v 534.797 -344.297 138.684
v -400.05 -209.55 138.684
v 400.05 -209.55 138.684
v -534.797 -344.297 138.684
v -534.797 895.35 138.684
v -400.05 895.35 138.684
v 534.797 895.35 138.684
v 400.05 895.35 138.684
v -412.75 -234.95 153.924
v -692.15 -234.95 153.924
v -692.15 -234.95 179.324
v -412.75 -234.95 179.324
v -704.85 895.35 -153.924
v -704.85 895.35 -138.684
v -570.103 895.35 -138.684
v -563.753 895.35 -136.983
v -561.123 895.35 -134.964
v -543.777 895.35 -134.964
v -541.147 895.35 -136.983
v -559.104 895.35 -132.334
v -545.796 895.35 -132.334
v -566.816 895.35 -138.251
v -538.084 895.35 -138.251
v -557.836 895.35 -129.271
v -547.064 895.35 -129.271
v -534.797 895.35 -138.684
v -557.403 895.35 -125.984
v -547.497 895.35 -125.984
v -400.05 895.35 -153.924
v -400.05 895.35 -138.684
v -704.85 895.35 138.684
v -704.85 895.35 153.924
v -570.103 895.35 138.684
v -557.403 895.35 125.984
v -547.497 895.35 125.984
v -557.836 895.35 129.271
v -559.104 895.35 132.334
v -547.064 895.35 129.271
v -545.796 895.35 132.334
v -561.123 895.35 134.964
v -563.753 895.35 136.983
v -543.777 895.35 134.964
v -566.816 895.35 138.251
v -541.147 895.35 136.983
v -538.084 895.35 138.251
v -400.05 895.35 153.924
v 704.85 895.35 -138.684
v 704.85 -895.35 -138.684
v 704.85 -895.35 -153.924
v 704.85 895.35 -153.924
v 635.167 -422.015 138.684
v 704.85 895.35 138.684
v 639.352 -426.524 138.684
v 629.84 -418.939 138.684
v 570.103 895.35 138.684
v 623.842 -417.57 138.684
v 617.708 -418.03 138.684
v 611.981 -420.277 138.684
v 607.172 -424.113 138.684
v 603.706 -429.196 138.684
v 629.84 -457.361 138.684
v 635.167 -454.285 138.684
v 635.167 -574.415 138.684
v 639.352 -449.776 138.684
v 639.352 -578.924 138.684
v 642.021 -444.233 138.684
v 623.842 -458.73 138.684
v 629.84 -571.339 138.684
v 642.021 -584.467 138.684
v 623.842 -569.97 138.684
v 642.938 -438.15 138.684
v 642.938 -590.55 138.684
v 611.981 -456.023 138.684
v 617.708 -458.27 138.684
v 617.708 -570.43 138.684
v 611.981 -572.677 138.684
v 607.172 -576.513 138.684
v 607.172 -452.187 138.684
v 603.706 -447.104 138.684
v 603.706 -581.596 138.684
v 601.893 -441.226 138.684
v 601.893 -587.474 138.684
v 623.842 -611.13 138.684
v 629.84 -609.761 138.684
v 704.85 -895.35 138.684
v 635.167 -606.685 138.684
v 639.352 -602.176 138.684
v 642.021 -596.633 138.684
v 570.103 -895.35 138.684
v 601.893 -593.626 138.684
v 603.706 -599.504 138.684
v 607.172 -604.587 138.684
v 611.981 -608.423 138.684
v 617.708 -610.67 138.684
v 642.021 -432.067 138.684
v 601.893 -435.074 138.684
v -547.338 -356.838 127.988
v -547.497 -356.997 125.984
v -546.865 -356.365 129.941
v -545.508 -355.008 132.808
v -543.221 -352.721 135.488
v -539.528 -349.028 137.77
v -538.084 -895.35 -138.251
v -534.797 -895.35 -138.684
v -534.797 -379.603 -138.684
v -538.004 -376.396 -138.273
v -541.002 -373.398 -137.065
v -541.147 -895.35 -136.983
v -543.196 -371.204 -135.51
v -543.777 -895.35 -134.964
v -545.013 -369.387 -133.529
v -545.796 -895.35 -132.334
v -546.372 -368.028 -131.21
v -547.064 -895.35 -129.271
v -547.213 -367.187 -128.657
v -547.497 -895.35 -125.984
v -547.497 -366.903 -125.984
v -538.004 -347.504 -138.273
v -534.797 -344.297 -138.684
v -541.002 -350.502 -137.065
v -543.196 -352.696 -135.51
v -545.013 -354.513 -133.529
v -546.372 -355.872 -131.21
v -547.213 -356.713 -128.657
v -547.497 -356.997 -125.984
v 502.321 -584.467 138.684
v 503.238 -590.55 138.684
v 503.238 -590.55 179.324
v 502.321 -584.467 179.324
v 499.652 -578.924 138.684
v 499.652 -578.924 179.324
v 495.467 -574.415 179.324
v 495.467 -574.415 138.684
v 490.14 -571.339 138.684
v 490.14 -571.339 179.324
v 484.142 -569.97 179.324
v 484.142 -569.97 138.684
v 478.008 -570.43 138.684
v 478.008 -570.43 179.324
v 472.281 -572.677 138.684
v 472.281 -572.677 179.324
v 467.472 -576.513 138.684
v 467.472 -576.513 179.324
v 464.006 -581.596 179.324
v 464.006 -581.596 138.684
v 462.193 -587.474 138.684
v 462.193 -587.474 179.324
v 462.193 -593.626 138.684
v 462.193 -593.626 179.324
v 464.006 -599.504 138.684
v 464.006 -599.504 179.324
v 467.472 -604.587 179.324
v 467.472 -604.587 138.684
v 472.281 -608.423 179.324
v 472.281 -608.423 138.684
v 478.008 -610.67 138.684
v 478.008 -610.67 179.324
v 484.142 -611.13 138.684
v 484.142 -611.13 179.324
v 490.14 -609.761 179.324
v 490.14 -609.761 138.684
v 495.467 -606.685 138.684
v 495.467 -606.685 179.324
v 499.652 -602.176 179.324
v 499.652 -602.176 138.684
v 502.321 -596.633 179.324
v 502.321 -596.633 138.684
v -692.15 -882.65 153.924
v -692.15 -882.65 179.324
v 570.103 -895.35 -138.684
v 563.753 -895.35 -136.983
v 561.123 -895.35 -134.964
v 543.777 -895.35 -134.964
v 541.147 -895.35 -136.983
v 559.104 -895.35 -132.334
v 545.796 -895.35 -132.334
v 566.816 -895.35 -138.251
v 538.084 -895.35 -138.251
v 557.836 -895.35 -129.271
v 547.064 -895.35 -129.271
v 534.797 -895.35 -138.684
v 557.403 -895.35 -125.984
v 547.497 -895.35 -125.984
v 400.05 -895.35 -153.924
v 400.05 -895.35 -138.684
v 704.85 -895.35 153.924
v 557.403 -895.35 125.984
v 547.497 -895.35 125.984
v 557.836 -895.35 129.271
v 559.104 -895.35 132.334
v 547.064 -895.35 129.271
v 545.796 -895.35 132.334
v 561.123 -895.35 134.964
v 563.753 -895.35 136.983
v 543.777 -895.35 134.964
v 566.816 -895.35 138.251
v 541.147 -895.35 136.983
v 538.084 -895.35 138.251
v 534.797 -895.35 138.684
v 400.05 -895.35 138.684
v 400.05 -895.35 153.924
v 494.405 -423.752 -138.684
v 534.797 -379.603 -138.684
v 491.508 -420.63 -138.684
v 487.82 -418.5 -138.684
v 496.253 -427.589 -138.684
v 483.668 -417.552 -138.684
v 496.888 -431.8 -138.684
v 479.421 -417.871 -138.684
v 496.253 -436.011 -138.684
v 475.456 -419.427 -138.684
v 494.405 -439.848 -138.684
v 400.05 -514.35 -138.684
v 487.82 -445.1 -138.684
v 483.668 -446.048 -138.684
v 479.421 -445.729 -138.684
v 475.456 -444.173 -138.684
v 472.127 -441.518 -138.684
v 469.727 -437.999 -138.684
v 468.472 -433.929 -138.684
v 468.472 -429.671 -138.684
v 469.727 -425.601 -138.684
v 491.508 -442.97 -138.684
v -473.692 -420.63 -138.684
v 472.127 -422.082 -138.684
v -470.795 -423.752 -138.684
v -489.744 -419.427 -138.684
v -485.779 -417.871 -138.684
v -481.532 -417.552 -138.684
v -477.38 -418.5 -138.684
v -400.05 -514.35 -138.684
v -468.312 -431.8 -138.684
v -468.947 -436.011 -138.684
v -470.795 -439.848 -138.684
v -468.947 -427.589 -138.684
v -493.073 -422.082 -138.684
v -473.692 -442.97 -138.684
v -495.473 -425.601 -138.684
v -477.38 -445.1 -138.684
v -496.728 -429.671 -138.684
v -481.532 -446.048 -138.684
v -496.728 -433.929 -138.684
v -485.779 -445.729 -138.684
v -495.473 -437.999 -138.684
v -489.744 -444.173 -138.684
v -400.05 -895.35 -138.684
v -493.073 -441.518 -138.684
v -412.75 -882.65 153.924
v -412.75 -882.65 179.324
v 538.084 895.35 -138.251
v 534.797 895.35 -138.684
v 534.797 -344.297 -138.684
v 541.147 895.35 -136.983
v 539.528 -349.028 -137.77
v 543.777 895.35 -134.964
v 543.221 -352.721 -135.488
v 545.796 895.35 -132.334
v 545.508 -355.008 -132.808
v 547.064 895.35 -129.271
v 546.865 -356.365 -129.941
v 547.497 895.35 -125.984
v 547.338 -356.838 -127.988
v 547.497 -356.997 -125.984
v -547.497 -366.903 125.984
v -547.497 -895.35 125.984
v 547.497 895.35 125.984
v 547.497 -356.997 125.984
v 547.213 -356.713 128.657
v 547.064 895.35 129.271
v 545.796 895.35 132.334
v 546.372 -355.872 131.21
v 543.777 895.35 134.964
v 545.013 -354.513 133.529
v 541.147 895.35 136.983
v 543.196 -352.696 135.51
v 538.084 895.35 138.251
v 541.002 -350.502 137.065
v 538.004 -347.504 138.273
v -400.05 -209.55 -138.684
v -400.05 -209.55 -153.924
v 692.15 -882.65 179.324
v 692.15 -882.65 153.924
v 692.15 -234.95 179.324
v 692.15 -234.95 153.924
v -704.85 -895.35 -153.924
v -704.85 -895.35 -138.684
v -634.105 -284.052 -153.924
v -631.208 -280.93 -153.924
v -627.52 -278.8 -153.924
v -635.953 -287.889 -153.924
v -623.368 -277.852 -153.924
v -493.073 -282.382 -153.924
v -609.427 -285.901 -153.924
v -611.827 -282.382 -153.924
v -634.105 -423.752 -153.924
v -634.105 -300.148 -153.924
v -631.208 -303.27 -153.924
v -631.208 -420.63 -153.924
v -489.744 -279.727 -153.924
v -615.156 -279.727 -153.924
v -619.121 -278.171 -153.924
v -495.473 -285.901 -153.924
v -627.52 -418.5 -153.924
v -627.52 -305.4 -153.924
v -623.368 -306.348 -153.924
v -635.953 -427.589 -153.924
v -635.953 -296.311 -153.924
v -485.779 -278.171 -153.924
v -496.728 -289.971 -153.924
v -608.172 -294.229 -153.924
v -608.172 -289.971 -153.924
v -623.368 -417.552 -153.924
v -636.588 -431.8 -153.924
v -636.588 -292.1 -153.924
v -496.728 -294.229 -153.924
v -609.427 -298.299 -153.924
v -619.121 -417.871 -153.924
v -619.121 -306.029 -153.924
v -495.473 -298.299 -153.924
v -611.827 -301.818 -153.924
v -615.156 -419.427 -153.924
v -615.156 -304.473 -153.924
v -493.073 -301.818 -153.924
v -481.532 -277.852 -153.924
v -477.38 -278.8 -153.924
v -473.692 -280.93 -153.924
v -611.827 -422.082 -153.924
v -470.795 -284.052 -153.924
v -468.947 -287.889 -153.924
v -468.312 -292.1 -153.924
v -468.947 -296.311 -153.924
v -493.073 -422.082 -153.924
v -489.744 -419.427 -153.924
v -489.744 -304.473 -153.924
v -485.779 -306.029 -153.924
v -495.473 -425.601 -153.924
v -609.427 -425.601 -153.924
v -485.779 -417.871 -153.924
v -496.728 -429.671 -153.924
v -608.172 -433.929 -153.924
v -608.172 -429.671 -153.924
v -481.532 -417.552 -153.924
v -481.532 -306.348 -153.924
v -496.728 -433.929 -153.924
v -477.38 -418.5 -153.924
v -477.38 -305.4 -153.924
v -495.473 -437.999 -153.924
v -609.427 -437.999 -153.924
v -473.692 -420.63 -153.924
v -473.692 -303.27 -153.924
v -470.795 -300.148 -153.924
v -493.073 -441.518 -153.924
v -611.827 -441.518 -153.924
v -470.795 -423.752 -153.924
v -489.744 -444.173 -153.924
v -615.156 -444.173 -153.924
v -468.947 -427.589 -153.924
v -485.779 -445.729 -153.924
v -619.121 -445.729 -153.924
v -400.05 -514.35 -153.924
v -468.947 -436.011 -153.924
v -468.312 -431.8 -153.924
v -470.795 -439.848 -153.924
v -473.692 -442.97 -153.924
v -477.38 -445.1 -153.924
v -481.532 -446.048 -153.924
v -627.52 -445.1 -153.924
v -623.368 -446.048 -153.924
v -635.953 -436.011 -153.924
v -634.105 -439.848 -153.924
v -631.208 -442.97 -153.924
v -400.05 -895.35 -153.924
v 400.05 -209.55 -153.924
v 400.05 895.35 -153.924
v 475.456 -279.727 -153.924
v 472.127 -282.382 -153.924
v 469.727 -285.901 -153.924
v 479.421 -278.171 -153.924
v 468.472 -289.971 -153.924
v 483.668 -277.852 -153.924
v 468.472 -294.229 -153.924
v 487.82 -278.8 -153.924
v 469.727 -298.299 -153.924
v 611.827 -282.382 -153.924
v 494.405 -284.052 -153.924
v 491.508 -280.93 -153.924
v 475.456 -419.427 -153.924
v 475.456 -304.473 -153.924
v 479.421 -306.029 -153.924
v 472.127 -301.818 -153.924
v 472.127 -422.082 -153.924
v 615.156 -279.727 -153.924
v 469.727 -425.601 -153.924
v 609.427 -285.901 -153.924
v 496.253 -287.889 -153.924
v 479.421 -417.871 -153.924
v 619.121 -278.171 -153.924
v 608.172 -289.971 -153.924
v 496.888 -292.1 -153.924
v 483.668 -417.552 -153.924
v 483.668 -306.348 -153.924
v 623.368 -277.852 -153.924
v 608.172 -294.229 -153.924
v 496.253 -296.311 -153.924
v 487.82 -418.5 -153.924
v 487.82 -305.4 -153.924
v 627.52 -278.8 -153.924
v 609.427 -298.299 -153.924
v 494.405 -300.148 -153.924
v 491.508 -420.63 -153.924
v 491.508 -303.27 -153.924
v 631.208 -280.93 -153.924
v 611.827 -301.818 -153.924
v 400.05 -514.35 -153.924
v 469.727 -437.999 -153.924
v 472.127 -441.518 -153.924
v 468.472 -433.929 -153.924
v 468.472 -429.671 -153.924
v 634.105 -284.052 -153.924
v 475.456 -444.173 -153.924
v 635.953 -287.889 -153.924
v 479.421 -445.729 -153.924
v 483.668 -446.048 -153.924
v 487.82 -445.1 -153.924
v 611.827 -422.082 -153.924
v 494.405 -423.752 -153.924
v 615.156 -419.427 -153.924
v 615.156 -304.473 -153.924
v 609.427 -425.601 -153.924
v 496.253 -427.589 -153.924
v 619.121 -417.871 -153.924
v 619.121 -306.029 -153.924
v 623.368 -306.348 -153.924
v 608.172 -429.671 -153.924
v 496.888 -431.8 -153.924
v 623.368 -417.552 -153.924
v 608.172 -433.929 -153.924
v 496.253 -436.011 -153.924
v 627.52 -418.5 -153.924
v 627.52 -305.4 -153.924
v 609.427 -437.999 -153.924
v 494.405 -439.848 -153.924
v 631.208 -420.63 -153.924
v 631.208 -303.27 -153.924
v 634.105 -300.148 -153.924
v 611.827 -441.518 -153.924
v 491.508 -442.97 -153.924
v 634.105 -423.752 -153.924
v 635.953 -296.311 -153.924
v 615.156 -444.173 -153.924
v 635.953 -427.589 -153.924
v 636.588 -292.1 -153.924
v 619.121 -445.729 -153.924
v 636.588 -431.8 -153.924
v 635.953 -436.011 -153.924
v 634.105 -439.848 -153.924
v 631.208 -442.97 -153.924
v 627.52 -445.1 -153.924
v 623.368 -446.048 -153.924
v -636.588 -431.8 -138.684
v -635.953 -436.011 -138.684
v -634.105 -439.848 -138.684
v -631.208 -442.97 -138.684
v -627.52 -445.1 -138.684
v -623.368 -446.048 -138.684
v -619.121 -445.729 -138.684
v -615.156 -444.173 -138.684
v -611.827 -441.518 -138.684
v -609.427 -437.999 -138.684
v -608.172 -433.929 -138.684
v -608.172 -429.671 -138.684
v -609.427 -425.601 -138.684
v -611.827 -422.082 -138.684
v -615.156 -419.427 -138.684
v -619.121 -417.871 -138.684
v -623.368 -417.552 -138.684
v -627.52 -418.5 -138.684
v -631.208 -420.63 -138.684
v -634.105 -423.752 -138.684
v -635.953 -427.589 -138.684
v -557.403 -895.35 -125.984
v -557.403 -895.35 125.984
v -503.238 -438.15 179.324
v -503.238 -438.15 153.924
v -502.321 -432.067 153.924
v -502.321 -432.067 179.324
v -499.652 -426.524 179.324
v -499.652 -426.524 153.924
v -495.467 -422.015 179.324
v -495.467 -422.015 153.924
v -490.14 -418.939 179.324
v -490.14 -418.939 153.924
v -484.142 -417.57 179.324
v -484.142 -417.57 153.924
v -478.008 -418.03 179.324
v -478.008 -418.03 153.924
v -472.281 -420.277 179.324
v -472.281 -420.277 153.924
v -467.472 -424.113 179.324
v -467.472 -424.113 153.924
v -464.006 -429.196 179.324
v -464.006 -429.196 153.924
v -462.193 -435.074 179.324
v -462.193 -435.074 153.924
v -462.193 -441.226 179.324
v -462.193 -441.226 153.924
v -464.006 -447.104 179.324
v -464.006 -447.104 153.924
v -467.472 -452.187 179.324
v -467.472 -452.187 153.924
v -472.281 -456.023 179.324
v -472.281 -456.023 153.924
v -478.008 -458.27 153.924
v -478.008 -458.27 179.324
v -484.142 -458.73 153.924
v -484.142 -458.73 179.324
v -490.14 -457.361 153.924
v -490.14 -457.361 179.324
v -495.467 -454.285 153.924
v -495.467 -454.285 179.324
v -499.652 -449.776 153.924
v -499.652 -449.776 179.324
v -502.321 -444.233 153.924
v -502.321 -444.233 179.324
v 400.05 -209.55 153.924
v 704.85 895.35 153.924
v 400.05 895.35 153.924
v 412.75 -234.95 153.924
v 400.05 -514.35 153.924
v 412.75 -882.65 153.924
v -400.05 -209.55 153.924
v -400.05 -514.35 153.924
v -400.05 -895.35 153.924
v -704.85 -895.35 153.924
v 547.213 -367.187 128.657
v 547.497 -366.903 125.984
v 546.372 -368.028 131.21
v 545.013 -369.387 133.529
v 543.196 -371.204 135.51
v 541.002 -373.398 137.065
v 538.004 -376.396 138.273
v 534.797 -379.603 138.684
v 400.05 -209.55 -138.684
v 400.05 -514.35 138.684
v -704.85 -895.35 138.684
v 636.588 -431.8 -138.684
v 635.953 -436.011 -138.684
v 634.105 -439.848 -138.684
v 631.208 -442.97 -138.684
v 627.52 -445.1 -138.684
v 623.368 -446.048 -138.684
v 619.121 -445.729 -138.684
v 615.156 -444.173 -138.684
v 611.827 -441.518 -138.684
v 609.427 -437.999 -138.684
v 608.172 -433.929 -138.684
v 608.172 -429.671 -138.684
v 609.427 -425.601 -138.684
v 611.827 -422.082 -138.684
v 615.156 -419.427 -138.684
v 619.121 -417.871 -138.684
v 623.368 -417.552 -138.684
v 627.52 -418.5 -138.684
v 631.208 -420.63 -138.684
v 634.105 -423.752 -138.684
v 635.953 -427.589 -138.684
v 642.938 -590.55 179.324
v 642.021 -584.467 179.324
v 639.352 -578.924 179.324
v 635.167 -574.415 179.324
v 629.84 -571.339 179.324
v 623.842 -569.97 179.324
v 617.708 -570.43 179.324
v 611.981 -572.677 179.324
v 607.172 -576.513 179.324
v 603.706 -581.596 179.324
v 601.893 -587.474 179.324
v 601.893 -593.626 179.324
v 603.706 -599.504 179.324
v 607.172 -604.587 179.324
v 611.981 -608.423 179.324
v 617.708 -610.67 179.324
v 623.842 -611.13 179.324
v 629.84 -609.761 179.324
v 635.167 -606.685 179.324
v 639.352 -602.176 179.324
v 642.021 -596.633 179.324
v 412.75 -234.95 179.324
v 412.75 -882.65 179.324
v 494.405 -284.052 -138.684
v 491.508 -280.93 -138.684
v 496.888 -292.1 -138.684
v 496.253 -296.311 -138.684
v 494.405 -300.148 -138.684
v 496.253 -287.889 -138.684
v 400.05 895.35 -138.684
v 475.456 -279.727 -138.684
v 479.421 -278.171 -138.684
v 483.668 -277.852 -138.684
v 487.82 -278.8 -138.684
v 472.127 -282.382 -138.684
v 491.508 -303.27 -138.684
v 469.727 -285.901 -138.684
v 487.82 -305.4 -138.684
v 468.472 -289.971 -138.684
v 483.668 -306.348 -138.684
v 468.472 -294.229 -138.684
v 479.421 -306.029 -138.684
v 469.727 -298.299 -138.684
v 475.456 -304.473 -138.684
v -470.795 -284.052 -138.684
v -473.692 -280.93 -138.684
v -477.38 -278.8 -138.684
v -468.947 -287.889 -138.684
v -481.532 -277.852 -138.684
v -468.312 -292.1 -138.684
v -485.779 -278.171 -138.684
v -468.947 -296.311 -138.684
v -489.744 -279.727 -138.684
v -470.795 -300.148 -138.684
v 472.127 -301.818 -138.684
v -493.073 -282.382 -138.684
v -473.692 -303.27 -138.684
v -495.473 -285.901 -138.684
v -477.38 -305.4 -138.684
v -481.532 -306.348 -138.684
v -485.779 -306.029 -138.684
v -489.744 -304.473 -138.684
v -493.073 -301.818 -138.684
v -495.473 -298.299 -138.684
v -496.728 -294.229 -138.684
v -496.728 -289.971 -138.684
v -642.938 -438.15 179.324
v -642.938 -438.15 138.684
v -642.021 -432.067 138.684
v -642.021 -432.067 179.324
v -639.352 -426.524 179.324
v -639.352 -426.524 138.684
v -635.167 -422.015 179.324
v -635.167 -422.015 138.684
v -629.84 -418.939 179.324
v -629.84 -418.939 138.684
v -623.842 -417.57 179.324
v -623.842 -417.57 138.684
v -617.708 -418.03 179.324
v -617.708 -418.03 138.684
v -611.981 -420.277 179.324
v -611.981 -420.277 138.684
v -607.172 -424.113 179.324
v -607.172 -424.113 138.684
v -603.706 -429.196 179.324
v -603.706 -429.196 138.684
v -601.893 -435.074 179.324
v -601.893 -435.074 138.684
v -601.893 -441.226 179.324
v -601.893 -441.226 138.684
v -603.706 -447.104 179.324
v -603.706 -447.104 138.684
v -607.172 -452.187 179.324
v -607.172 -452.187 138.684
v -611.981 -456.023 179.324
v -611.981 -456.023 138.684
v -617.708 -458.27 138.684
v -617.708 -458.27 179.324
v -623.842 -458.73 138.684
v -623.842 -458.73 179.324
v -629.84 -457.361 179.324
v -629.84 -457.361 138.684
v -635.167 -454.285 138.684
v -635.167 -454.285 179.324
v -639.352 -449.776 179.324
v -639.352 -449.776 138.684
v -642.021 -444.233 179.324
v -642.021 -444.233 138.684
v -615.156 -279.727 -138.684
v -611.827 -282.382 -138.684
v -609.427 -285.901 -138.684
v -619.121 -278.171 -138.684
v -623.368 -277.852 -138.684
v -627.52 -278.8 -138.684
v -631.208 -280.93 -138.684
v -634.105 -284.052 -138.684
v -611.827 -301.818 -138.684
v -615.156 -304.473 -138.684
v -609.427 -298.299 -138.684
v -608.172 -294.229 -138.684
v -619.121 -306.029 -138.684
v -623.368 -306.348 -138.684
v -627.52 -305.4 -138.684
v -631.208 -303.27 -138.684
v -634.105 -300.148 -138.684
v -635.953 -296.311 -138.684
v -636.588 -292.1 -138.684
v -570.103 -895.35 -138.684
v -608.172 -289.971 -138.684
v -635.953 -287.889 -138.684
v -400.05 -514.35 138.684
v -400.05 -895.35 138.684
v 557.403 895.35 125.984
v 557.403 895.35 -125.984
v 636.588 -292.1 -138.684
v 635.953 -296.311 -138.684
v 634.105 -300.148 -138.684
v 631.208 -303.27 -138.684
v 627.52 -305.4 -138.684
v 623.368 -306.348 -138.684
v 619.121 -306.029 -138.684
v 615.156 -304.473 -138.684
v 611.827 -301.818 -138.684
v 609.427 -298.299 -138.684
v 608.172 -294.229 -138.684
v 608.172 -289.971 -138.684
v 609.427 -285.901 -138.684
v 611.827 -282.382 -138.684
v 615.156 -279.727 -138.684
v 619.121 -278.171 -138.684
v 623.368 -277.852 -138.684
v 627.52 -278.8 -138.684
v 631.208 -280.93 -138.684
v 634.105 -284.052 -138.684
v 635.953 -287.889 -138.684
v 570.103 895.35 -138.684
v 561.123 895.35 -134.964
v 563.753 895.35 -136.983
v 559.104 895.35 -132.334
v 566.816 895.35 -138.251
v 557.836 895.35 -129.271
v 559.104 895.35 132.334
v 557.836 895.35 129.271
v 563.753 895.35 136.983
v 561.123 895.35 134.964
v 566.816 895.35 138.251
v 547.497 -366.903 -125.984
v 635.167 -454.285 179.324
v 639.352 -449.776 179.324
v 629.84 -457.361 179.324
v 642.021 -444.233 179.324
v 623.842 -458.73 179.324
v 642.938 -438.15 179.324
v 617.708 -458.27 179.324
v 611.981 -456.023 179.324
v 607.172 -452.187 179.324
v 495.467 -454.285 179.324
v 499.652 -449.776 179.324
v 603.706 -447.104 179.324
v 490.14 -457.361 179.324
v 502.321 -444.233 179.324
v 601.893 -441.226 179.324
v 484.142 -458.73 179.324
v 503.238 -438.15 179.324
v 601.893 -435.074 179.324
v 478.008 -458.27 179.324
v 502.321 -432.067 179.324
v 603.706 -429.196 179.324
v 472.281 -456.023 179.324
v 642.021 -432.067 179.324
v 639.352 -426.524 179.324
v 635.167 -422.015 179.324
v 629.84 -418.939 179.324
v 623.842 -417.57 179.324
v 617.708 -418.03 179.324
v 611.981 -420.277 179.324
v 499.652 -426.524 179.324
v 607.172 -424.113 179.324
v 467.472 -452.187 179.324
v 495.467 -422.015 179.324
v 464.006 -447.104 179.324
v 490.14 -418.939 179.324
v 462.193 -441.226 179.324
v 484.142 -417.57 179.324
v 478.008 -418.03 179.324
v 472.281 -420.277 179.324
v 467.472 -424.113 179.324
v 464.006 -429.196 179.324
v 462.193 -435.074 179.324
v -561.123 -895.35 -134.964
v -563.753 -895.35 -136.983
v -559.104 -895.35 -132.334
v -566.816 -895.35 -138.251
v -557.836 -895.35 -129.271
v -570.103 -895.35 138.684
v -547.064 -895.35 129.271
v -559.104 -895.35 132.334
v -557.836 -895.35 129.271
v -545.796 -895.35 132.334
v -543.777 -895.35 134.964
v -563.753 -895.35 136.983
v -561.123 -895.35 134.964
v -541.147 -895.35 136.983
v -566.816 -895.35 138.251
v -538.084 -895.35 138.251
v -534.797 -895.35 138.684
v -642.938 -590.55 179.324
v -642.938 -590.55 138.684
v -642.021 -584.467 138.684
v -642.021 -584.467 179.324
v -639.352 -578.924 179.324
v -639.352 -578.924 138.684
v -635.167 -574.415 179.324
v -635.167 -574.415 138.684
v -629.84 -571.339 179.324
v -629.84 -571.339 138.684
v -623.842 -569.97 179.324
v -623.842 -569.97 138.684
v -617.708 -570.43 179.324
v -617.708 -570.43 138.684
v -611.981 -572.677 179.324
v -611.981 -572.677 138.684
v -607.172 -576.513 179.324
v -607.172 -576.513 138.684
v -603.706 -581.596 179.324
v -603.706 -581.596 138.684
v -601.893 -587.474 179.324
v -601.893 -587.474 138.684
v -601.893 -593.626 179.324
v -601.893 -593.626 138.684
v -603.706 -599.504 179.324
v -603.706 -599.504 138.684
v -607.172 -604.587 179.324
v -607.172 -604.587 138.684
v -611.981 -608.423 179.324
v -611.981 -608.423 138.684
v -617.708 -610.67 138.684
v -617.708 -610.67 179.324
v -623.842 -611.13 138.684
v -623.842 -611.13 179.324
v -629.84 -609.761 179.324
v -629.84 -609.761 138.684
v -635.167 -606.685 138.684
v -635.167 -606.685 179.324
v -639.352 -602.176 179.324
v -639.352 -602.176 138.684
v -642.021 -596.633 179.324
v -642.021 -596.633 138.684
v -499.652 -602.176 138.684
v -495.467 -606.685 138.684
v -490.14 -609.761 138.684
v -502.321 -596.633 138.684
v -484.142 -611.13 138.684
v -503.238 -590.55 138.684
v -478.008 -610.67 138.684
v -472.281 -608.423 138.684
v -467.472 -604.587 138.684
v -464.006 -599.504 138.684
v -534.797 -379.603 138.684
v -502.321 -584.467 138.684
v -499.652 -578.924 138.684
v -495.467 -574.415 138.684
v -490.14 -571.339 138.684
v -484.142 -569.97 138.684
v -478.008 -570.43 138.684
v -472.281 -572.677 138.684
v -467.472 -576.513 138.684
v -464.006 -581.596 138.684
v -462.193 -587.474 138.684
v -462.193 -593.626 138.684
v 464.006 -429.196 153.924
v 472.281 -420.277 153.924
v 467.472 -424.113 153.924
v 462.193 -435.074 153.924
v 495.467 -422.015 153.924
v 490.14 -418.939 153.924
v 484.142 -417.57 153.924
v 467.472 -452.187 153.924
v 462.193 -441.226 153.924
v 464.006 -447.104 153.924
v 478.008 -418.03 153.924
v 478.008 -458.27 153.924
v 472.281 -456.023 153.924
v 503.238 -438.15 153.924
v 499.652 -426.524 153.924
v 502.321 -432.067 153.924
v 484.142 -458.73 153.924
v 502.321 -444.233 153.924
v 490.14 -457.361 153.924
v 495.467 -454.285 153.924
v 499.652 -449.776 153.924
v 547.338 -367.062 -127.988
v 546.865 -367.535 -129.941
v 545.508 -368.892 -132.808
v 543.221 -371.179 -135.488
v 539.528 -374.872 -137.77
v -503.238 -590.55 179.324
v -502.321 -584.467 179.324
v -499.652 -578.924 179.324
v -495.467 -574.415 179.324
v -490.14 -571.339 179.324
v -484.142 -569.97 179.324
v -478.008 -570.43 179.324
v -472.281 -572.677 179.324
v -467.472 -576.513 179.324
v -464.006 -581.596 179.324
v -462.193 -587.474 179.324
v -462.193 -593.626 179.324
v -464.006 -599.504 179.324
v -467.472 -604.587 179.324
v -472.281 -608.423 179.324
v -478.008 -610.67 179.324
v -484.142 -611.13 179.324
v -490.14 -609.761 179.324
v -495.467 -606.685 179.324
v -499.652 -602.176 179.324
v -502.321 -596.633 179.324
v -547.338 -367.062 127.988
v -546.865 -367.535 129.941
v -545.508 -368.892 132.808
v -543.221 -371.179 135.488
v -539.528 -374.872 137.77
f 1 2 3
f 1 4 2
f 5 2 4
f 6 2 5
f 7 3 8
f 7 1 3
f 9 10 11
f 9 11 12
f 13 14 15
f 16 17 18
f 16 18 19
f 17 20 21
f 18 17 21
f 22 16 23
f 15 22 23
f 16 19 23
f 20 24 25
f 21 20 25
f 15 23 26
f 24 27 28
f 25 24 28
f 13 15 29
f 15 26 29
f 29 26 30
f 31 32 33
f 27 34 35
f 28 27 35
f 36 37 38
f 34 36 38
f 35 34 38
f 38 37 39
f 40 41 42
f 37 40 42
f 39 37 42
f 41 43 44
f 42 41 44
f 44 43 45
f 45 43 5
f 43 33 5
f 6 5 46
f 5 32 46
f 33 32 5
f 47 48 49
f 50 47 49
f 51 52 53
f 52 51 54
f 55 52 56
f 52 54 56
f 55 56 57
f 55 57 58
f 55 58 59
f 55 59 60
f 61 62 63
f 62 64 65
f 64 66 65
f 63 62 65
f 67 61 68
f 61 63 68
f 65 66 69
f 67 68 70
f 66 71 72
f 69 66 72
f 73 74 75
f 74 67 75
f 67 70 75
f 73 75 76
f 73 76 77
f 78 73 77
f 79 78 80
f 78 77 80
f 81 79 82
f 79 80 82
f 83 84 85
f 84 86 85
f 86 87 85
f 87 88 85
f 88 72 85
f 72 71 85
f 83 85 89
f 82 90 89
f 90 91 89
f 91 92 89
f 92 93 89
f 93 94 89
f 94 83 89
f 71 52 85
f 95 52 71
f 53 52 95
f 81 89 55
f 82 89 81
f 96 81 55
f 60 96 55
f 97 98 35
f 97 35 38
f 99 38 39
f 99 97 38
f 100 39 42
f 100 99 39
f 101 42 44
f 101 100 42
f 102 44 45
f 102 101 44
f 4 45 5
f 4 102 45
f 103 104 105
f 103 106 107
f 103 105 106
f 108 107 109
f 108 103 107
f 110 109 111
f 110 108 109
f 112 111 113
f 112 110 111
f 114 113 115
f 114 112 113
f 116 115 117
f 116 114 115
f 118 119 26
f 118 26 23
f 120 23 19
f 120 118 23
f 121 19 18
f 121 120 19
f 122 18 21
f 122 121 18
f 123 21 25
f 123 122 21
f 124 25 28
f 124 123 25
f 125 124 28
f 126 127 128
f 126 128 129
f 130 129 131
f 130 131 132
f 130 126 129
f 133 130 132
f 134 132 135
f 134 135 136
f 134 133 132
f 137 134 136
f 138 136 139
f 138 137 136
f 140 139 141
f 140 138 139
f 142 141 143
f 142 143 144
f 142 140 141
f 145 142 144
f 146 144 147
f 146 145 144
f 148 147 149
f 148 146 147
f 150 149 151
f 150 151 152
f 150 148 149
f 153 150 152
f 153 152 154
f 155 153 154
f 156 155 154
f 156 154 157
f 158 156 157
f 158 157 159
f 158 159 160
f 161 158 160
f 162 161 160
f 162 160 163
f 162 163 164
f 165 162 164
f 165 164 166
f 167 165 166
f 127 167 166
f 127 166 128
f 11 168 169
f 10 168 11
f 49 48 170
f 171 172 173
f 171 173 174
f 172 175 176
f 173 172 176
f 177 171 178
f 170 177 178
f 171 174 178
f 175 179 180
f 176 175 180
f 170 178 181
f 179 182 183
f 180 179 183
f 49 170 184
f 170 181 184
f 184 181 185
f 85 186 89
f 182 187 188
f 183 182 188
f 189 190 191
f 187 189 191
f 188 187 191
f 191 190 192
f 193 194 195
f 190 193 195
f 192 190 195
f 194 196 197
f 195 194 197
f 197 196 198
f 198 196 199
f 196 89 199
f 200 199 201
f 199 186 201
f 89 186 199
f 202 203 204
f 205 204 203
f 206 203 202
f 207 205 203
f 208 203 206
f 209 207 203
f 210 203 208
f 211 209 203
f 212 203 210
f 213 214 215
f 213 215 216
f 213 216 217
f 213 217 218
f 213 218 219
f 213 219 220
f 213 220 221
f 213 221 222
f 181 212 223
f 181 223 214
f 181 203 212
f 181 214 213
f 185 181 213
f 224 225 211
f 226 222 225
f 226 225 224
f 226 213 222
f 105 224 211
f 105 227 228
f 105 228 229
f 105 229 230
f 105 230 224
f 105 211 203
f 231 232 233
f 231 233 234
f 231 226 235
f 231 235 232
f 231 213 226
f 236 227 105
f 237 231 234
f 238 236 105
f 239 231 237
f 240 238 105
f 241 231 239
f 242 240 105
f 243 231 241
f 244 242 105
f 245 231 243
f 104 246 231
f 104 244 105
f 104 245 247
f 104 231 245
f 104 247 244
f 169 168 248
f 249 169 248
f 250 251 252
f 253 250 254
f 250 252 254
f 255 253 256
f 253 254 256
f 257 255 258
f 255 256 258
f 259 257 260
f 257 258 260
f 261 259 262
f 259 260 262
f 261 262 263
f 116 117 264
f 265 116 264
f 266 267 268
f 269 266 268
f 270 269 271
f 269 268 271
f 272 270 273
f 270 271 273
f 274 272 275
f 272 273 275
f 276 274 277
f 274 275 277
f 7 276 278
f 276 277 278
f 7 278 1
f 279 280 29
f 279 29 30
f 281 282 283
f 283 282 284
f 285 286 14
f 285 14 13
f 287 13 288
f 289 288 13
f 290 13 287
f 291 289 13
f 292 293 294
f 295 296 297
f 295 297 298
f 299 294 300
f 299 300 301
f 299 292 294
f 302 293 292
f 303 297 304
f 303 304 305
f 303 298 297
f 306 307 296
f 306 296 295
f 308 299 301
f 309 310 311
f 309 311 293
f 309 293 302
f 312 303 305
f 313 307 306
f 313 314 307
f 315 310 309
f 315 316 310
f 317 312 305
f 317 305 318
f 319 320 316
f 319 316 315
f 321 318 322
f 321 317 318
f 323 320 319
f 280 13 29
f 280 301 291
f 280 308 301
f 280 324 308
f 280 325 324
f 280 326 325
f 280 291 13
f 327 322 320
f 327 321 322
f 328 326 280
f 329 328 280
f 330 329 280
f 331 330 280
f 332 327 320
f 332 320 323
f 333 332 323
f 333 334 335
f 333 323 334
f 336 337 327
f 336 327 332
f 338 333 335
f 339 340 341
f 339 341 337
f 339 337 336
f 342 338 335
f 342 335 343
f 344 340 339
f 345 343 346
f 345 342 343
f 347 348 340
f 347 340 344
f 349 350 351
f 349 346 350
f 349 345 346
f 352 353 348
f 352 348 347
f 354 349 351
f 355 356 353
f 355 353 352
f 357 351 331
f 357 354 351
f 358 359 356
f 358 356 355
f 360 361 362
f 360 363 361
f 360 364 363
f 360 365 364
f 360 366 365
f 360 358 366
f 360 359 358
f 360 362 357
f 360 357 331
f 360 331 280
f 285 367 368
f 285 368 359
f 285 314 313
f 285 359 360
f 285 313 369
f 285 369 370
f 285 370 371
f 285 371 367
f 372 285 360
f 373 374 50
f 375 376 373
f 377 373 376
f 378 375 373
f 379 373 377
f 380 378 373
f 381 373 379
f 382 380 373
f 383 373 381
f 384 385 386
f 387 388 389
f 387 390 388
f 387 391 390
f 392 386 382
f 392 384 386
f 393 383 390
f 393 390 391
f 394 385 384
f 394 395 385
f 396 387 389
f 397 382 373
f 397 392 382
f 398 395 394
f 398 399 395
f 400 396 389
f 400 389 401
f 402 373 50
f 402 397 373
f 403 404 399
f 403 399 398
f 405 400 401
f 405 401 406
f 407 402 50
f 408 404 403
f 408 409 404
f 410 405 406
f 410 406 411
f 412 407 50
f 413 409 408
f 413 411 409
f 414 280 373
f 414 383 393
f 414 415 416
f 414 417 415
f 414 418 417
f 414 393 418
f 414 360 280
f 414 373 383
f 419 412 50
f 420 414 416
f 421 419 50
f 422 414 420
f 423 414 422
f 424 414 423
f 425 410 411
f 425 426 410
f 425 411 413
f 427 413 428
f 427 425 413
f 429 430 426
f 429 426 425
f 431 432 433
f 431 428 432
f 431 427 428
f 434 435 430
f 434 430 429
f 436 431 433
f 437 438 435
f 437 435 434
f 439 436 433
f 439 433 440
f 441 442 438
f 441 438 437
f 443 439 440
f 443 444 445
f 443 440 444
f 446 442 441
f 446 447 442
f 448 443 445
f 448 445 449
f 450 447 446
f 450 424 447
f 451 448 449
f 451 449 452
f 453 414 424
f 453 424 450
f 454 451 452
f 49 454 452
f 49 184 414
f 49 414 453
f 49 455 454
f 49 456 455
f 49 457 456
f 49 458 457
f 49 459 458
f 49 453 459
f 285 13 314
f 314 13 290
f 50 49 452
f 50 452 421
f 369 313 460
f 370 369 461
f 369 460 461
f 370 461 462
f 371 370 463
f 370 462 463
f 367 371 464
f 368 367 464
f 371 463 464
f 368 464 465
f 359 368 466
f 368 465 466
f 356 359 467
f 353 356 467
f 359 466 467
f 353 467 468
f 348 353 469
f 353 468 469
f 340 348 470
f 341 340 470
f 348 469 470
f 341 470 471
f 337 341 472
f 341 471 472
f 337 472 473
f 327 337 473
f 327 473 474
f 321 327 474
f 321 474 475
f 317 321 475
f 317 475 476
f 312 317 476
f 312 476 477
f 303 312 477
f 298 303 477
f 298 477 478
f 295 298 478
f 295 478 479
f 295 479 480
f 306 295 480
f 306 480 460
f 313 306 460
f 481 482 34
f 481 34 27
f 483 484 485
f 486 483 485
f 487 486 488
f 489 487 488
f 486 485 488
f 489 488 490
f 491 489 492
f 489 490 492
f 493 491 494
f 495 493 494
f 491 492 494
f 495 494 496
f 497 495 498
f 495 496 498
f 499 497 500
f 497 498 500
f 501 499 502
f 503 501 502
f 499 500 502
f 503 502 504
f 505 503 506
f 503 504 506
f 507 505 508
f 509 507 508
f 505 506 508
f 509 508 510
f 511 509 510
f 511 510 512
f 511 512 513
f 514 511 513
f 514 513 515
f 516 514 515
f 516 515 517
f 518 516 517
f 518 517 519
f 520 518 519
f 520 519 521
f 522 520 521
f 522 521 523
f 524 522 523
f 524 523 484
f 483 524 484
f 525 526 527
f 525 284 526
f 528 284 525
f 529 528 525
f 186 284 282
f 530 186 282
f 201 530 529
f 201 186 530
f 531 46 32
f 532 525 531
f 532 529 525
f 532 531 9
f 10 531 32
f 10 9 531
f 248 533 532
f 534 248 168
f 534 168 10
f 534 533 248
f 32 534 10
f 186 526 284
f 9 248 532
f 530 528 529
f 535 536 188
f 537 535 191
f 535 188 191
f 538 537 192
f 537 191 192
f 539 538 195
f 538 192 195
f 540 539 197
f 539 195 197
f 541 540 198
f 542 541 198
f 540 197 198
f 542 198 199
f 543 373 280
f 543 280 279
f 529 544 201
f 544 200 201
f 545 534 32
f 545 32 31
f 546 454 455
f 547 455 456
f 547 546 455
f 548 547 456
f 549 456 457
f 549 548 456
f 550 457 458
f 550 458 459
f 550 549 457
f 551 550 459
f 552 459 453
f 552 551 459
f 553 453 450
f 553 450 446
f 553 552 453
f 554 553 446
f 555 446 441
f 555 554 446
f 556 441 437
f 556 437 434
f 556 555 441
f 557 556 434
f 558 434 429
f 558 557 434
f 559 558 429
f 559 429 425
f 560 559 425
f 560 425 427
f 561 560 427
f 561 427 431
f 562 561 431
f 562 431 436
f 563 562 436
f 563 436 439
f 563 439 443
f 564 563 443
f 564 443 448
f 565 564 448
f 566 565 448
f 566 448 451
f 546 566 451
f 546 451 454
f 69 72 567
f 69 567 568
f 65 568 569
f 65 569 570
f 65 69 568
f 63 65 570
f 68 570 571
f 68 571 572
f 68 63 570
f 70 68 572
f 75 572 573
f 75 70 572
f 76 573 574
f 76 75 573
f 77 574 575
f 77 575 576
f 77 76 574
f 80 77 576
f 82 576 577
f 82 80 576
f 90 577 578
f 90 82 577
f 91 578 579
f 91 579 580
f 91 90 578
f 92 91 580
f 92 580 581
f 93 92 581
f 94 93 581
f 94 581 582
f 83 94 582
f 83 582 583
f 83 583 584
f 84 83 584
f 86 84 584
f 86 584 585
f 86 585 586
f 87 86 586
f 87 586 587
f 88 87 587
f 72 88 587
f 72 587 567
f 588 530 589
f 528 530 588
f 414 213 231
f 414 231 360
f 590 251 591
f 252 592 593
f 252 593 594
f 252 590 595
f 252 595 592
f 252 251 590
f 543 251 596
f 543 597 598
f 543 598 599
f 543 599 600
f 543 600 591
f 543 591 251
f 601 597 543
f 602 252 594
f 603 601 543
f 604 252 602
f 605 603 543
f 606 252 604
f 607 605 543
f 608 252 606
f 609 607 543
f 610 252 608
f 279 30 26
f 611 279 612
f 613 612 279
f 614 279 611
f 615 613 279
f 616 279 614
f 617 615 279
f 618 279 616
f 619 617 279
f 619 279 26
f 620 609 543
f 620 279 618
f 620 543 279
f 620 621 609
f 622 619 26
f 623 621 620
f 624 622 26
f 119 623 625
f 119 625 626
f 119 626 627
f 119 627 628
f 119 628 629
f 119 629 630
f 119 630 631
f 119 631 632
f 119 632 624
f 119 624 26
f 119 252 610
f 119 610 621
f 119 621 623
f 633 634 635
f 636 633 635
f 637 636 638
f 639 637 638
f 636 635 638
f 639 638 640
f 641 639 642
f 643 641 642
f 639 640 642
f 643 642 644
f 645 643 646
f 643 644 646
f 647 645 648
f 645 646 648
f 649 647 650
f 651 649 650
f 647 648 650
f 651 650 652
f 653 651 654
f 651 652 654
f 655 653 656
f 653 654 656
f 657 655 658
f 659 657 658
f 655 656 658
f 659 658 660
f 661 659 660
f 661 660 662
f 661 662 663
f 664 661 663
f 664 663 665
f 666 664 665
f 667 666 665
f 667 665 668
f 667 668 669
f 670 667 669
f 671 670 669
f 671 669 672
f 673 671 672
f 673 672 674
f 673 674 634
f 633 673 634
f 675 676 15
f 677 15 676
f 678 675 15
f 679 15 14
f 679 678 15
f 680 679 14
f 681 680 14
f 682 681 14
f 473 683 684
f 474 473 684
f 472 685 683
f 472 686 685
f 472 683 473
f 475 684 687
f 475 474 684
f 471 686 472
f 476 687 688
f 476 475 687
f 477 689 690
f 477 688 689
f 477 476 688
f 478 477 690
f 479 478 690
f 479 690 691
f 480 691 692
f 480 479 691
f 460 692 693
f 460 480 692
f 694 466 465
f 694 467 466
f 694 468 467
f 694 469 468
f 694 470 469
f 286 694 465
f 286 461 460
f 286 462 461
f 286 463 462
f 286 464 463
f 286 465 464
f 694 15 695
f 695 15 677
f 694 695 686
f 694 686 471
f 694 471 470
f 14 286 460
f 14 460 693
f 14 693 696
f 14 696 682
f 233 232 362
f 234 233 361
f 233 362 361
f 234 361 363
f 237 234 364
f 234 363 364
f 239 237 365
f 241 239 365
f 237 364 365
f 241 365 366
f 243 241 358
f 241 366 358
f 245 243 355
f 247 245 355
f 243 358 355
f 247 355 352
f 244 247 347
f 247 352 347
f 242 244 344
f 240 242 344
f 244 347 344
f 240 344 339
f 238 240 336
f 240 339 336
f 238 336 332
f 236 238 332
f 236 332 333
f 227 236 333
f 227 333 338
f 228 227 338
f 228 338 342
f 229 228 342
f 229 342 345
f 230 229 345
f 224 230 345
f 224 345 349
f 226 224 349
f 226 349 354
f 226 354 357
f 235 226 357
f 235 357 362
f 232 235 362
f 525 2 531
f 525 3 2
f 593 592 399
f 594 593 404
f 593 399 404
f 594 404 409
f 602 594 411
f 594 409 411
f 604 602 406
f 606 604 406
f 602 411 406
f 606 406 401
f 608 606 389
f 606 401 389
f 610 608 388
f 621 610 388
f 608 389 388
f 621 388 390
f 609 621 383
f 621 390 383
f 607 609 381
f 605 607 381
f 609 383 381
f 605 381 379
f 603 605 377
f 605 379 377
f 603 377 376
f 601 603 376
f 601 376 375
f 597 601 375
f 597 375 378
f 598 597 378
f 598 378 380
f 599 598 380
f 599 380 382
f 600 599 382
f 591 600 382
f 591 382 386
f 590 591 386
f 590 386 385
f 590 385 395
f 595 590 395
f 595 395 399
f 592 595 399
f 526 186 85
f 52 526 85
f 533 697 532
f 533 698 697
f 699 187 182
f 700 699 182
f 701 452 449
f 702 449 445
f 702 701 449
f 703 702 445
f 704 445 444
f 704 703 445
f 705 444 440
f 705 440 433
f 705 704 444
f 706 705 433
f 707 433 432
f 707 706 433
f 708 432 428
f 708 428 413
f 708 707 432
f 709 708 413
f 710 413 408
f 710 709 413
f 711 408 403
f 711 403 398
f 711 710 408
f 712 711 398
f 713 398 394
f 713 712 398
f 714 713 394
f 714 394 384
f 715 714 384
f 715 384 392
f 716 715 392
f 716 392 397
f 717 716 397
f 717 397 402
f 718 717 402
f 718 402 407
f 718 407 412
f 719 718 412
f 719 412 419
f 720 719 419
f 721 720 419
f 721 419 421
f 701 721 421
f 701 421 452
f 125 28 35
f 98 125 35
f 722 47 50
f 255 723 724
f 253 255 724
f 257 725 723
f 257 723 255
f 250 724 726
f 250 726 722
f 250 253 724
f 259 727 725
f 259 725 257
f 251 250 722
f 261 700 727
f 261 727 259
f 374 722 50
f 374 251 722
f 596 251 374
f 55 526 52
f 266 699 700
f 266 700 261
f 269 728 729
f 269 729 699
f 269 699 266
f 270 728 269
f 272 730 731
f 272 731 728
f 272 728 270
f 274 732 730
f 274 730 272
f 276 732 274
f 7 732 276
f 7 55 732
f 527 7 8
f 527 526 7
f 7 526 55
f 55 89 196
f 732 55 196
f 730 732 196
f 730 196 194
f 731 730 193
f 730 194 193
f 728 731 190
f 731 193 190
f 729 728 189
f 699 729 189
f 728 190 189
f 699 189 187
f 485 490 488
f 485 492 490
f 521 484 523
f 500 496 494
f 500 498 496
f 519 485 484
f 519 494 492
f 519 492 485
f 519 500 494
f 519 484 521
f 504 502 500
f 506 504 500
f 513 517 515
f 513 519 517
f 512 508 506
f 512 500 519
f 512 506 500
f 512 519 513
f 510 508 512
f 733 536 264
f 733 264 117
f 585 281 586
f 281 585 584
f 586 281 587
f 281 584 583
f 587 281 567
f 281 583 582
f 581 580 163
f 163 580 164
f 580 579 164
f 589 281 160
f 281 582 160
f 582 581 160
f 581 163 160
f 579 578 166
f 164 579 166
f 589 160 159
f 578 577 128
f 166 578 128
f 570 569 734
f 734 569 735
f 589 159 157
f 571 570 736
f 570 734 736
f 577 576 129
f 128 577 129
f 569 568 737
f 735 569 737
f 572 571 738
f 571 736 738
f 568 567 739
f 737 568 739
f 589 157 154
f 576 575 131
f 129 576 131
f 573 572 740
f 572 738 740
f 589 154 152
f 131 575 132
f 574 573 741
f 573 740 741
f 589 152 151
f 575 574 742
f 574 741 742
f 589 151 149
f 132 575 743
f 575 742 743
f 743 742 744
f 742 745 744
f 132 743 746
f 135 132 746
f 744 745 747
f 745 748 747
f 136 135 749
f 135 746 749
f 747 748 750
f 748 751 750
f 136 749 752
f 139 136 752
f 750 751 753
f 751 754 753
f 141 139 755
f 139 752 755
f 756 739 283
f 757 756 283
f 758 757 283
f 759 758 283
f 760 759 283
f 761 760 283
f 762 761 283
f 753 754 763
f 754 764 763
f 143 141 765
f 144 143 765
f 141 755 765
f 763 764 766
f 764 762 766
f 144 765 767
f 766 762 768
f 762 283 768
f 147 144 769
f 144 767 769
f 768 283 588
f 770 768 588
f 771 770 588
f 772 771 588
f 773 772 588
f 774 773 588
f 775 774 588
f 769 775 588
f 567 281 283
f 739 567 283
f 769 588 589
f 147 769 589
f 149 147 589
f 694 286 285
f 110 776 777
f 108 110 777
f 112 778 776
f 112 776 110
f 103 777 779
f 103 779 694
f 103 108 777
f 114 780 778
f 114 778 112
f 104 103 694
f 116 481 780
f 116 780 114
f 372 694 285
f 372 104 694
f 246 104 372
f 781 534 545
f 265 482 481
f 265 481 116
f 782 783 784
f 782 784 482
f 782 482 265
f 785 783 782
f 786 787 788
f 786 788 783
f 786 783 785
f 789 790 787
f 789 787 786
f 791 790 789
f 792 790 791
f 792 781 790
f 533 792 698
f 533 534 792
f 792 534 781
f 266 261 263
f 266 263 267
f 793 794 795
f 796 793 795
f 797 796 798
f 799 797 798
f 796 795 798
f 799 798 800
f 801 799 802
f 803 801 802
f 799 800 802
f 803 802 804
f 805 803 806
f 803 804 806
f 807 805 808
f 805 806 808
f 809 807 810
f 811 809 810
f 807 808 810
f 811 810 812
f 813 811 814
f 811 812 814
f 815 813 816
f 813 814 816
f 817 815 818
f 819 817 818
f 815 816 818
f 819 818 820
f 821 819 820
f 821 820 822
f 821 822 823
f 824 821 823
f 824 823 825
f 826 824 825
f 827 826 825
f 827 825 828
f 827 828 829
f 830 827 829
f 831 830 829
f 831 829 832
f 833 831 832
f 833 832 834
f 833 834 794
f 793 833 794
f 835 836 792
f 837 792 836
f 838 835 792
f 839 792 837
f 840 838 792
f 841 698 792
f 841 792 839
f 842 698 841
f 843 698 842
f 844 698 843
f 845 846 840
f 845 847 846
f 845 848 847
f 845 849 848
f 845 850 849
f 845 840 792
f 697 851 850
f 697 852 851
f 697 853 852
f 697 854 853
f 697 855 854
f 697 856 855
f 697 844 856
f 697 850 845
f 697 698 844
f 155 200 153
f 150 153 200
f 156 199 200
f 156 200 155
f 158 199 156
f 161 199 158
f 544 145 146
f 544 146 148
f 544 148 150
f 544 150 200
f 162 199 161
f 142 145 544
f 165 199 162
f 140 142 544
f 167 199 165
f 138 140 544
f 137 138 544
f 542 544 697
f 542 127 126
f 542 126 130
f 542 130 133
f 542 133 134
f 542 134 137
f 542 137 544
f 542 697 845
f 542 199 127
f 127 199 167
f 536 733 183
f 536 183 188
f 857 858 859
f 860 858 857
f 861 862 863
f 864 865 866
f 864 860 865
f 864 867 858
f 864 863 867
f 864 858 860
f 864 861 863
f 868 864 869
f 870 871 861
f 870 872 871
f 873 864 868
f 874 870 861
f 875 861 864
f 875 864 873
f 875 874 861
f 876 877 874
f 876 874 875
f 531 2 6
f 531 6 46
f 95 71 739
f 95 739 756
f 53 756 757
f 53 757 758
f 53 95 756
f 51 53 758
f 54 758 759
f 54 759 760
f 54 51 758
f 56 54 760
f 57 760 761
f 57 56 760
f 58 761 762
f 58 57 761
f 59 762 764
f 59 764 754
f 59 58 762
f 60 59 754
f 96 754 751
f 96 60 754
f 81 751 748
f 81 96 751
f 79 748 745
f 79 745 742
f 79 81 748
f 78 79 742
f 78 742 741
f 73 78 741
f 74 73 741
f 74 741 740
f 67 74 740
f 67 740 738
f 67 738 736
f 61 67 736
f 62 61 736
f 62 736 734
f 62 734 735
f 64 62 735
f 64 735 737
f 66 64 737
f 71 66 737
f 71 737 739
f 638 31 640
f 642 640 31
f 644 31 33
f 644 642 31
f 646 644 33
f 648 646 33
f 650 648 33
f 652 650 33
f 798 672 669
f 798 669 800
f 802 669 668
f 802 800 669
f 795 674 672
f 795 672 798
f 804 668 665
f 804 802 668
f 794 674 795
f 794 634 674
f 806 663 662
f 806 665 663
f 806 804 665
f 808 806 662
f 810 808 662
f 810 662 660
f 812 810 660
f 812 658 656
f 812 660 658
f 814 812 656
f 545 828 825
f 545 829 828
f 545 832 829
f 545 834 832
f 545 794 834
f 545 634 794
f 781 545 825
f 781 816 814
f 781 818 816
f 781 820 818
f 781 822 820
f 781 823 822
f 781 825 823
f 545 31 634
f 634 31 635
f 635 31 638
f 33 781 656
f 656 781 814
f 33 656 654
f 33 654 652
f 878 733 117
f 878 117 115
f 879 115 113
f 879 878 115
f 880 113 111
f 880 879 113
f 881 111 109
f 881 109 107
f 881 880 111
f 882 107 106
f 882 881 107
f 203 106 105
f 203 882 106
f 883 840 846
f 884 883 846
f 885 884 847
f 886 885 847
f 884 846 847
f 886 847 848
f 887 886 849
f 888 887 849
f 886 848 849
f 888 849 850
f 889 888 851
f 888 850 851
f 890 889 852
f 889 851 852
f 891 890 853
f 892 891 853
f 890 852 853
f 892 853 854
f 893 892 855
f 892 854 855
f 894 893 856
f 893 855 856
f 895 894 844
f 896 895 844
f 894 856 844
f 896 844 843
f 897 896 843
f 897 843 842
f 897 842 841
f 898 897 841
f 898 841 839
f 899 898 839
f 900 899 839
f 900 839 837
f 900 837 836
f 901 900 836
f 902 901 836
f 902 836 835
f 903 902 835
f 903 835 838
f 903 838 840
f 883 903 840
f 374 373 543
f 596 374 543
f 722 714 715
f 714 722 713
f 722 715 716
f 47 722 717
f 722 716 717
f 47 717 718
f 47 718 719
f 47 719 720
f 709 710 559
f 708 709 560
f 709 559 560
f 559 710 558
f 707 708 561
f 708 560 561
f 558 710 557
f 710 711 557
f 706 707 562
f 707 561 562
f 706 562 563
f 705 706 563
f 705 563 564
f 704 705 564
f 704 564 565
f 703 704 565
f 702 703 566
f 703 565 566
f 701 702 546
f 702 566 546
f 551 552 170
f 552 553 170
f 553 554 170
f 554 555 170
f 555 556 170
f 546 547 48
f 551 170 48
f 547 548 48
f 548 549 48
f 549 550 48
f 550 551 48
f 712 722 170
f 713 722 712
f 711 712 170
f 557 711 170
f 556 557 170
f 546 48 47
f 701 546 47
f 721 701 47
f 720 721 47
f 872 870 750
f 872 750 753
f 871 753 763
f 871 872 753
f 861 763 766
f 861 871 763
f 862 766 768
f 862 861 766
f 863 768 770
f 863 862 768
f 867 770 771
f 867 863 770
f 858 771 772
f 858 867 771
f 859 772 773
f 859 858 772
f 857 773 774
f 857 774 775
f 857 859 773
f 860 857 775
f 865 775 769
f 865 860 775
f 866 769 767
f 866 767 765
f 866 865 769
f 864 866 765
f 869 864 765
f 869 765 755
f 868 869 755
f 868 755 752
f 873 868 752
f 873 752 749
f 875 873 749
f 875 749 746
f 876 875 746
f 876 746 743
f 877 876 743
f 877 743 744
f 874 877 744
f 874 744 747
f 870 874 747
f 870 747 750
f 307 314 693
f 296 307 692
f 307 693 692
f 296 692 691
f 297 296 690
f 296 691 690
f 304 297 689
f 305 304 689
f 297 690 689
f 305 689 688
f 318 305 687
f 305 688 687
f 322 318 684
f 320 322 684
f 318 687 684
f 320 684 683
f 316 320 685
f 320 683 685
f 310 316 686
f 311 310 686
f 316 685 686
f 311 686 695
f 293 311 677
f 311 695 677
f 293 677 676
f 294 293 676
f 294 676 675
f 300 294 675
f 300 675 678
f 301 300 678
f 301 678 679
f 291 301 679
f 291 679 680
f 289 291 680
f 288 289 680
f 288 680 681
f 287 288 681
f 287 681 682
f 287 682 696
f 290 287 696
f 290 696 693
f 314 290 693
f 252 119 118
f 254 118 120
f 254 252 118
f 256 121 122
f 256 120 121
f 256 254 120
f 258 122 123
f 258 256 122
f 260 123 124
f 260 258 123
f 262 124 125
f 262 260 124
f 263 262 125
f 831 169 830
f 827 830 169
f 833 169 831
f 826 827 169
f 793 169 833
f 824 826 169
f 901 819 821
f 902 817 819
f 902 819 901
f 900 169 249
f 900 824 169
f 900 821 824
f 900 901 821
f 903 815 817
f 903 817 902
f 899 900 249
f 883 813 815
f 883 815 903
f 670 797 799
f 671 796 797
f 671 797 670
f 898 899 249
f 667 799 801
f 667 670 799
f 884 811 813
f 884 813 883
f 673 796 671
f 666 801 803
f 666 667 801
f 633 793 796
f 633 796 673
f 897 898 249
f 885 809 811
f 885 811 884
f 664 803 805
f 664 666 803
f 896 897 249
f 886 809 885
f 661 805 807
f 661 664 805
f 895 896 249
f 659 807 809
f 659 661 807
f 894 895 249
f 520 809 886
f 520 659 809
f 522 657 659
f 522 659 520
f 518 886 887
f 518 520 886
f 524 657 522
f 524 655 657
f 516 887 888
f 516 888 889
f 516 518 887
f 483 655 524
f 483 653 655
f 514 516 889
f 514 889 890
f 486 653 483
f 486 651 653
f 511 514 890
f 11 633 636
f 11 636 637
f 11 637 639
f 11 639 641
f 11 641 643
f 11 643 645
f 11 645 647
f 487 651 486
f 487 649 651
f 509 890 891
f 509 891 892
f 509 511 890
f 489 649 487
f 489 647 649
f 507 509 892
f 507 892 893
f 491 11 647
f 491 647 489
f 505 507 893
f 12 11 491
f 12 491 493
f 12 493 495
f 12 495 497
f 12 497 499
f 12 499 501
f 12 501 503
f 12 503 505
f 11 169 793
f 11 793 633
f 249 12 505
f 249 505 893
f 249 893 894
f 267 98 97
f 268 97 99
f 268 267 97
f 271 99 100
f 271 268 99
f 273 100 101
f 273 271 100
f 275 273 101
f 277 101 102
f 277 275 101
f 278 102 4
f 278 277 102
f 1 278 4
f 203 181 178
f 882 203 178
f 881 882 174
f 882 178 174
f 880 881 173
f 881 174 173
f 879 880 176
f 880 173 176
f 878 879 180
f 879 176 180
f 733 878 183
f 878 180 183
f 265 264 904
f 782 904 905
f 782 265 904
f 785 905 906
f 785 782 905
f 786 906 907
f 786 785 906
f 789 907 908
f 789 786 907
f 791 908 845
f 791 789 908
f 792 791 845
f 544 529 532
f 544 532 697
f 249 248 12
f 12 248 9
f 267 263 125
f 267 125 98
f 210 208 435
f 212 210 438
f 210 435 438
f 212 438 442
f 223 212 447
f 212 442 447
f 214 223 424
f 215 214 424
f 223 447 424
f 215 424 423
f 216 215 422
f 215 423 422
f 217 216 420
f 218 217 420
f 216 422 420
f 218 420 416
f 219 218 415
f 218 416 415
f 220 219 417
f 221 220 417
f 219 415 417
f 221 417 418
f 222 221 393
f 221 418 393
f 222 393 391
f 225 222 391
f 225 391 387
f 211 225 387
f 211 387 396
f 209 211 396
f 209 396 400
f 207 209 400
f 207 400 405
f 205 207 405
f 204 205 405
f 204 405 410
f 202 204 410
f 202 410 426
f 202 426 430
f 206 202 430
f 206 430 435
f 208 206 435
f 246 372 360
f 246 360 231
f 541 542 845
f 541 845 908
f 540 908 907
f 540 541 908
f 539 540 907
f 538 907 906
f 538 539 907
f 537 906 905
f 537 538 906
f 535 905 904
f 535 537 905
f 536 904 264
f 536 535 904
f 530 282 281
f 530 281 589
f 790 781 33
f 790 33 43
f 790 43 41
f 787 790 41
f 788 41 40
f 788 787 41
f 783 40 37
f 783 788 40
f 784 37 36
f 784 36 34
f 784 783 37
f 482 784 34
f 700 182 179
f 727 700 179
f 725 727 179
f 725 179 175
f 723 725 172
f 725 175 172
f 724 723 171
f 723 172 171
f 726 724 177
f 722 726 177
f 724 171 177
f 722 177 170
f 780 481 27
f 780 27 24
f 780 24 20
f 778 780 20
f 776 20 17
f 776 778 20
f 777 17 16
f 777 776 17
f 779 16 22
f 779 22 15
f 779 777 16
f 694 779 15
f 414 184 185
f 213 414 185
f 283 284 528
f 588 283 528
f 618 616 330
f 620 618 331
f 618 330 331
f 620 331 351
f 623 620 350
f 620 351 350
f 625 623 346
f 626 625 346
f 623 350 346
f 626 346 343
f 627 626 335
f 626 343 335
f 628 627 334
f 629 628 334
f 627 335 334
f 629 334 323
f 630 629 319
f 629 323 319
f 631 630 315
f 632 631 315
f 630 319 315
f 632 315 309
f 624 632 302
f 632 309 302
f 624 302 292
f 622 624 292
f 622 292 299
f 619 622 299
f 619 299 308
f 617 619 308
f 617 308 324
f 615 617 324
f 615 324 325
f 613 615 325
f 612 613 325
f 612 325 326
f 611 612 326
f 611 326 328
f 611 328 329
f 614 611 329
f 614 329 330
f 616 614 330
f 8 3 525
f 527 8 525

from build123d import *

# Parameters (mm, degrees)
F1_DEPTH  = 895.35
F2_W      = 279.4
F2_H      = 647.7
F3_DEPTH  = 25.4
F5_D      = 41.275
F5_DEPTH  = 76.2
F7_D      = 28.575
F7_DEPTH  = 76.2
F10_DEPTH = 552.45
F11_R     = 14.2875
F12_DEPTH = 76.2


with BuildPart() as f1:
    # F0 (on Front) → F1 (new body, symmetric)
    with BuildSketch(Plane.XZ):
        with BuildLine():
            Line((-400.05, 153.924), (-704.85, 153.924))
            Line((-704.85, 153.924), (-704.85, 138.684))
            Line((-704.85, 138.684), (-570.103, 138.684))
            ThreePointArc((-570.103, 138.684), (-561.122744, 134.964256), (-557.403, 125.984))
            Line((-557.403, 125.984), (-557.403, -125.984))
            ThreePointArc((-557.403, -125.984), (-561.122744, -134.964256), (-570.103, -138.684))
            Line((-570.103, -138.684), (-704.85, -138.684))
            Line((-704.85, -138.684), (-704.85, -153.924))
            Line((-704.85, -153.924), (-400.05, -153.924))
            Line((-400.05, -153.924), (-400.05, -138.684))
            Line((-400.05, -138.684), (-534.797, -138.684))
            ThreePointArc((-534.797, -138.684), (-543.777256, -134.964256), (-547.497, -125.984))
            Line((-547.497, -125.984), (-547.497, 125.984))
            ThreePointArc((-547.497, 125.984), (-543.777256, 134.964256), (-534.797, 138.684))
            Line((-534.797, 138.684), (-400.05, 138.684))
            Line((-400.05, 138.684), (-400.05, 153.924))
        make_face()
    extrude(amount=F1_DEPTH, both=True)

    # F2 (on face) → F3 (join)
    with BuildSketch(Plane.XY.offset(153.924)):
        with Locations((-552.45, -558.8)):
            Rectangle(F2_W, F2_H)
    extrude(amount=F3_DEPTH)

    # F5
    with Locations(Plane.XY.offset(179.324)):
        with Locations((-622.3, -438.15), (-482.6, -438.15), (-622.3, -590.55), (-482.6, -590.55)):
            Hole(F5_D / 2, depth=F5_DEPTH)

    # F7
    with Locations(Plane(origin=(0, 0, -153.924), x_dir=(1, 0, 0), z_dir=(0, 0, -1))):
        with Locations((-482.6, 431.8), (-482.6, 292.1), (-622.3, 431.8), (-622.3, 292.1)):
            Hole(F7_D / 2, depth=F7_DEPTH)



with BuildPart() as f8_1:
    # F8: instance of F1
    add(f1.part.mirror(Plane.YZ))


with BuildPart() as f1_1:
    add(f1.part)

    add(f8_1.part)  # F10 merges F8_1
    # F9 (on Right) → F10 (join, symmetric)
    with BuildSketch(Plane.YZ):
        with BuildLine():
            Line((-209.55, 153.924), (-514.35, 153.924))
            Line((-514.35, 153.924), (-514.35, 138.684))
            Line((-514.35, 138.684), (-379.603, 138.684))
            ThreePointArc((-379.603, 138.684), (-370.622744, 134.964256), (-366.903, 125.984))
            Line((-366.903, 125.984), (-366.903, -125.984))
            ThreePointArc((-366.903, -125.984), (-370.622744, -134.964256), (-379.603, -138.684))
            Line((-379.603, -138.684), (-514.35, -138.684))
            Line((-514.35, -138.684), (-514.35, -153.924))
            Line((-514.35, -153.924), (-209.55, -153.924))
            Line((-209.55, -153.924), (-209.55, -138.684))
            Line((-209.55, -138.684), (-344.297, -138.684))
            ThreePointArc((-344.297, -138.684), (-353.277256, -134.964256), (-356.997, -125.984))
            Line((-356.997, -125.984), (-356.997, 125.984))
            ThreePointArc((-356.997, 125.984), (-353.277256, 134.964256), (-344.297, 138.684))
            Line((-344.297, 138.684), (-209.55, 138.684))
            Line((-209.55, 138.684), (-209.55, 153.924))
        make_face()
    extrude(amount=F10_DEPTH, both=True)

    # F11 (on face) → F12 (cut)
    with BuildSketch(Plane(origin=(0, 0, -153.924), x_dir=(1, 0, 0), z_dir=(0, 0, -1))):
        with Locations((-482.6, 431.8)):
            Circle(F11_R)
        with Locations((-482.6, 292.1)):
            Circle(F11_R)
        with Locations((482.6, 431.8)):
            Circle(F11_R)
        with Locations((482.6, 292.1)):
            Circle(F11_R)
    extrude(amount=-F12_DEPTH, mode=Mode.SUBTRACT)


solid = f1_1.part
